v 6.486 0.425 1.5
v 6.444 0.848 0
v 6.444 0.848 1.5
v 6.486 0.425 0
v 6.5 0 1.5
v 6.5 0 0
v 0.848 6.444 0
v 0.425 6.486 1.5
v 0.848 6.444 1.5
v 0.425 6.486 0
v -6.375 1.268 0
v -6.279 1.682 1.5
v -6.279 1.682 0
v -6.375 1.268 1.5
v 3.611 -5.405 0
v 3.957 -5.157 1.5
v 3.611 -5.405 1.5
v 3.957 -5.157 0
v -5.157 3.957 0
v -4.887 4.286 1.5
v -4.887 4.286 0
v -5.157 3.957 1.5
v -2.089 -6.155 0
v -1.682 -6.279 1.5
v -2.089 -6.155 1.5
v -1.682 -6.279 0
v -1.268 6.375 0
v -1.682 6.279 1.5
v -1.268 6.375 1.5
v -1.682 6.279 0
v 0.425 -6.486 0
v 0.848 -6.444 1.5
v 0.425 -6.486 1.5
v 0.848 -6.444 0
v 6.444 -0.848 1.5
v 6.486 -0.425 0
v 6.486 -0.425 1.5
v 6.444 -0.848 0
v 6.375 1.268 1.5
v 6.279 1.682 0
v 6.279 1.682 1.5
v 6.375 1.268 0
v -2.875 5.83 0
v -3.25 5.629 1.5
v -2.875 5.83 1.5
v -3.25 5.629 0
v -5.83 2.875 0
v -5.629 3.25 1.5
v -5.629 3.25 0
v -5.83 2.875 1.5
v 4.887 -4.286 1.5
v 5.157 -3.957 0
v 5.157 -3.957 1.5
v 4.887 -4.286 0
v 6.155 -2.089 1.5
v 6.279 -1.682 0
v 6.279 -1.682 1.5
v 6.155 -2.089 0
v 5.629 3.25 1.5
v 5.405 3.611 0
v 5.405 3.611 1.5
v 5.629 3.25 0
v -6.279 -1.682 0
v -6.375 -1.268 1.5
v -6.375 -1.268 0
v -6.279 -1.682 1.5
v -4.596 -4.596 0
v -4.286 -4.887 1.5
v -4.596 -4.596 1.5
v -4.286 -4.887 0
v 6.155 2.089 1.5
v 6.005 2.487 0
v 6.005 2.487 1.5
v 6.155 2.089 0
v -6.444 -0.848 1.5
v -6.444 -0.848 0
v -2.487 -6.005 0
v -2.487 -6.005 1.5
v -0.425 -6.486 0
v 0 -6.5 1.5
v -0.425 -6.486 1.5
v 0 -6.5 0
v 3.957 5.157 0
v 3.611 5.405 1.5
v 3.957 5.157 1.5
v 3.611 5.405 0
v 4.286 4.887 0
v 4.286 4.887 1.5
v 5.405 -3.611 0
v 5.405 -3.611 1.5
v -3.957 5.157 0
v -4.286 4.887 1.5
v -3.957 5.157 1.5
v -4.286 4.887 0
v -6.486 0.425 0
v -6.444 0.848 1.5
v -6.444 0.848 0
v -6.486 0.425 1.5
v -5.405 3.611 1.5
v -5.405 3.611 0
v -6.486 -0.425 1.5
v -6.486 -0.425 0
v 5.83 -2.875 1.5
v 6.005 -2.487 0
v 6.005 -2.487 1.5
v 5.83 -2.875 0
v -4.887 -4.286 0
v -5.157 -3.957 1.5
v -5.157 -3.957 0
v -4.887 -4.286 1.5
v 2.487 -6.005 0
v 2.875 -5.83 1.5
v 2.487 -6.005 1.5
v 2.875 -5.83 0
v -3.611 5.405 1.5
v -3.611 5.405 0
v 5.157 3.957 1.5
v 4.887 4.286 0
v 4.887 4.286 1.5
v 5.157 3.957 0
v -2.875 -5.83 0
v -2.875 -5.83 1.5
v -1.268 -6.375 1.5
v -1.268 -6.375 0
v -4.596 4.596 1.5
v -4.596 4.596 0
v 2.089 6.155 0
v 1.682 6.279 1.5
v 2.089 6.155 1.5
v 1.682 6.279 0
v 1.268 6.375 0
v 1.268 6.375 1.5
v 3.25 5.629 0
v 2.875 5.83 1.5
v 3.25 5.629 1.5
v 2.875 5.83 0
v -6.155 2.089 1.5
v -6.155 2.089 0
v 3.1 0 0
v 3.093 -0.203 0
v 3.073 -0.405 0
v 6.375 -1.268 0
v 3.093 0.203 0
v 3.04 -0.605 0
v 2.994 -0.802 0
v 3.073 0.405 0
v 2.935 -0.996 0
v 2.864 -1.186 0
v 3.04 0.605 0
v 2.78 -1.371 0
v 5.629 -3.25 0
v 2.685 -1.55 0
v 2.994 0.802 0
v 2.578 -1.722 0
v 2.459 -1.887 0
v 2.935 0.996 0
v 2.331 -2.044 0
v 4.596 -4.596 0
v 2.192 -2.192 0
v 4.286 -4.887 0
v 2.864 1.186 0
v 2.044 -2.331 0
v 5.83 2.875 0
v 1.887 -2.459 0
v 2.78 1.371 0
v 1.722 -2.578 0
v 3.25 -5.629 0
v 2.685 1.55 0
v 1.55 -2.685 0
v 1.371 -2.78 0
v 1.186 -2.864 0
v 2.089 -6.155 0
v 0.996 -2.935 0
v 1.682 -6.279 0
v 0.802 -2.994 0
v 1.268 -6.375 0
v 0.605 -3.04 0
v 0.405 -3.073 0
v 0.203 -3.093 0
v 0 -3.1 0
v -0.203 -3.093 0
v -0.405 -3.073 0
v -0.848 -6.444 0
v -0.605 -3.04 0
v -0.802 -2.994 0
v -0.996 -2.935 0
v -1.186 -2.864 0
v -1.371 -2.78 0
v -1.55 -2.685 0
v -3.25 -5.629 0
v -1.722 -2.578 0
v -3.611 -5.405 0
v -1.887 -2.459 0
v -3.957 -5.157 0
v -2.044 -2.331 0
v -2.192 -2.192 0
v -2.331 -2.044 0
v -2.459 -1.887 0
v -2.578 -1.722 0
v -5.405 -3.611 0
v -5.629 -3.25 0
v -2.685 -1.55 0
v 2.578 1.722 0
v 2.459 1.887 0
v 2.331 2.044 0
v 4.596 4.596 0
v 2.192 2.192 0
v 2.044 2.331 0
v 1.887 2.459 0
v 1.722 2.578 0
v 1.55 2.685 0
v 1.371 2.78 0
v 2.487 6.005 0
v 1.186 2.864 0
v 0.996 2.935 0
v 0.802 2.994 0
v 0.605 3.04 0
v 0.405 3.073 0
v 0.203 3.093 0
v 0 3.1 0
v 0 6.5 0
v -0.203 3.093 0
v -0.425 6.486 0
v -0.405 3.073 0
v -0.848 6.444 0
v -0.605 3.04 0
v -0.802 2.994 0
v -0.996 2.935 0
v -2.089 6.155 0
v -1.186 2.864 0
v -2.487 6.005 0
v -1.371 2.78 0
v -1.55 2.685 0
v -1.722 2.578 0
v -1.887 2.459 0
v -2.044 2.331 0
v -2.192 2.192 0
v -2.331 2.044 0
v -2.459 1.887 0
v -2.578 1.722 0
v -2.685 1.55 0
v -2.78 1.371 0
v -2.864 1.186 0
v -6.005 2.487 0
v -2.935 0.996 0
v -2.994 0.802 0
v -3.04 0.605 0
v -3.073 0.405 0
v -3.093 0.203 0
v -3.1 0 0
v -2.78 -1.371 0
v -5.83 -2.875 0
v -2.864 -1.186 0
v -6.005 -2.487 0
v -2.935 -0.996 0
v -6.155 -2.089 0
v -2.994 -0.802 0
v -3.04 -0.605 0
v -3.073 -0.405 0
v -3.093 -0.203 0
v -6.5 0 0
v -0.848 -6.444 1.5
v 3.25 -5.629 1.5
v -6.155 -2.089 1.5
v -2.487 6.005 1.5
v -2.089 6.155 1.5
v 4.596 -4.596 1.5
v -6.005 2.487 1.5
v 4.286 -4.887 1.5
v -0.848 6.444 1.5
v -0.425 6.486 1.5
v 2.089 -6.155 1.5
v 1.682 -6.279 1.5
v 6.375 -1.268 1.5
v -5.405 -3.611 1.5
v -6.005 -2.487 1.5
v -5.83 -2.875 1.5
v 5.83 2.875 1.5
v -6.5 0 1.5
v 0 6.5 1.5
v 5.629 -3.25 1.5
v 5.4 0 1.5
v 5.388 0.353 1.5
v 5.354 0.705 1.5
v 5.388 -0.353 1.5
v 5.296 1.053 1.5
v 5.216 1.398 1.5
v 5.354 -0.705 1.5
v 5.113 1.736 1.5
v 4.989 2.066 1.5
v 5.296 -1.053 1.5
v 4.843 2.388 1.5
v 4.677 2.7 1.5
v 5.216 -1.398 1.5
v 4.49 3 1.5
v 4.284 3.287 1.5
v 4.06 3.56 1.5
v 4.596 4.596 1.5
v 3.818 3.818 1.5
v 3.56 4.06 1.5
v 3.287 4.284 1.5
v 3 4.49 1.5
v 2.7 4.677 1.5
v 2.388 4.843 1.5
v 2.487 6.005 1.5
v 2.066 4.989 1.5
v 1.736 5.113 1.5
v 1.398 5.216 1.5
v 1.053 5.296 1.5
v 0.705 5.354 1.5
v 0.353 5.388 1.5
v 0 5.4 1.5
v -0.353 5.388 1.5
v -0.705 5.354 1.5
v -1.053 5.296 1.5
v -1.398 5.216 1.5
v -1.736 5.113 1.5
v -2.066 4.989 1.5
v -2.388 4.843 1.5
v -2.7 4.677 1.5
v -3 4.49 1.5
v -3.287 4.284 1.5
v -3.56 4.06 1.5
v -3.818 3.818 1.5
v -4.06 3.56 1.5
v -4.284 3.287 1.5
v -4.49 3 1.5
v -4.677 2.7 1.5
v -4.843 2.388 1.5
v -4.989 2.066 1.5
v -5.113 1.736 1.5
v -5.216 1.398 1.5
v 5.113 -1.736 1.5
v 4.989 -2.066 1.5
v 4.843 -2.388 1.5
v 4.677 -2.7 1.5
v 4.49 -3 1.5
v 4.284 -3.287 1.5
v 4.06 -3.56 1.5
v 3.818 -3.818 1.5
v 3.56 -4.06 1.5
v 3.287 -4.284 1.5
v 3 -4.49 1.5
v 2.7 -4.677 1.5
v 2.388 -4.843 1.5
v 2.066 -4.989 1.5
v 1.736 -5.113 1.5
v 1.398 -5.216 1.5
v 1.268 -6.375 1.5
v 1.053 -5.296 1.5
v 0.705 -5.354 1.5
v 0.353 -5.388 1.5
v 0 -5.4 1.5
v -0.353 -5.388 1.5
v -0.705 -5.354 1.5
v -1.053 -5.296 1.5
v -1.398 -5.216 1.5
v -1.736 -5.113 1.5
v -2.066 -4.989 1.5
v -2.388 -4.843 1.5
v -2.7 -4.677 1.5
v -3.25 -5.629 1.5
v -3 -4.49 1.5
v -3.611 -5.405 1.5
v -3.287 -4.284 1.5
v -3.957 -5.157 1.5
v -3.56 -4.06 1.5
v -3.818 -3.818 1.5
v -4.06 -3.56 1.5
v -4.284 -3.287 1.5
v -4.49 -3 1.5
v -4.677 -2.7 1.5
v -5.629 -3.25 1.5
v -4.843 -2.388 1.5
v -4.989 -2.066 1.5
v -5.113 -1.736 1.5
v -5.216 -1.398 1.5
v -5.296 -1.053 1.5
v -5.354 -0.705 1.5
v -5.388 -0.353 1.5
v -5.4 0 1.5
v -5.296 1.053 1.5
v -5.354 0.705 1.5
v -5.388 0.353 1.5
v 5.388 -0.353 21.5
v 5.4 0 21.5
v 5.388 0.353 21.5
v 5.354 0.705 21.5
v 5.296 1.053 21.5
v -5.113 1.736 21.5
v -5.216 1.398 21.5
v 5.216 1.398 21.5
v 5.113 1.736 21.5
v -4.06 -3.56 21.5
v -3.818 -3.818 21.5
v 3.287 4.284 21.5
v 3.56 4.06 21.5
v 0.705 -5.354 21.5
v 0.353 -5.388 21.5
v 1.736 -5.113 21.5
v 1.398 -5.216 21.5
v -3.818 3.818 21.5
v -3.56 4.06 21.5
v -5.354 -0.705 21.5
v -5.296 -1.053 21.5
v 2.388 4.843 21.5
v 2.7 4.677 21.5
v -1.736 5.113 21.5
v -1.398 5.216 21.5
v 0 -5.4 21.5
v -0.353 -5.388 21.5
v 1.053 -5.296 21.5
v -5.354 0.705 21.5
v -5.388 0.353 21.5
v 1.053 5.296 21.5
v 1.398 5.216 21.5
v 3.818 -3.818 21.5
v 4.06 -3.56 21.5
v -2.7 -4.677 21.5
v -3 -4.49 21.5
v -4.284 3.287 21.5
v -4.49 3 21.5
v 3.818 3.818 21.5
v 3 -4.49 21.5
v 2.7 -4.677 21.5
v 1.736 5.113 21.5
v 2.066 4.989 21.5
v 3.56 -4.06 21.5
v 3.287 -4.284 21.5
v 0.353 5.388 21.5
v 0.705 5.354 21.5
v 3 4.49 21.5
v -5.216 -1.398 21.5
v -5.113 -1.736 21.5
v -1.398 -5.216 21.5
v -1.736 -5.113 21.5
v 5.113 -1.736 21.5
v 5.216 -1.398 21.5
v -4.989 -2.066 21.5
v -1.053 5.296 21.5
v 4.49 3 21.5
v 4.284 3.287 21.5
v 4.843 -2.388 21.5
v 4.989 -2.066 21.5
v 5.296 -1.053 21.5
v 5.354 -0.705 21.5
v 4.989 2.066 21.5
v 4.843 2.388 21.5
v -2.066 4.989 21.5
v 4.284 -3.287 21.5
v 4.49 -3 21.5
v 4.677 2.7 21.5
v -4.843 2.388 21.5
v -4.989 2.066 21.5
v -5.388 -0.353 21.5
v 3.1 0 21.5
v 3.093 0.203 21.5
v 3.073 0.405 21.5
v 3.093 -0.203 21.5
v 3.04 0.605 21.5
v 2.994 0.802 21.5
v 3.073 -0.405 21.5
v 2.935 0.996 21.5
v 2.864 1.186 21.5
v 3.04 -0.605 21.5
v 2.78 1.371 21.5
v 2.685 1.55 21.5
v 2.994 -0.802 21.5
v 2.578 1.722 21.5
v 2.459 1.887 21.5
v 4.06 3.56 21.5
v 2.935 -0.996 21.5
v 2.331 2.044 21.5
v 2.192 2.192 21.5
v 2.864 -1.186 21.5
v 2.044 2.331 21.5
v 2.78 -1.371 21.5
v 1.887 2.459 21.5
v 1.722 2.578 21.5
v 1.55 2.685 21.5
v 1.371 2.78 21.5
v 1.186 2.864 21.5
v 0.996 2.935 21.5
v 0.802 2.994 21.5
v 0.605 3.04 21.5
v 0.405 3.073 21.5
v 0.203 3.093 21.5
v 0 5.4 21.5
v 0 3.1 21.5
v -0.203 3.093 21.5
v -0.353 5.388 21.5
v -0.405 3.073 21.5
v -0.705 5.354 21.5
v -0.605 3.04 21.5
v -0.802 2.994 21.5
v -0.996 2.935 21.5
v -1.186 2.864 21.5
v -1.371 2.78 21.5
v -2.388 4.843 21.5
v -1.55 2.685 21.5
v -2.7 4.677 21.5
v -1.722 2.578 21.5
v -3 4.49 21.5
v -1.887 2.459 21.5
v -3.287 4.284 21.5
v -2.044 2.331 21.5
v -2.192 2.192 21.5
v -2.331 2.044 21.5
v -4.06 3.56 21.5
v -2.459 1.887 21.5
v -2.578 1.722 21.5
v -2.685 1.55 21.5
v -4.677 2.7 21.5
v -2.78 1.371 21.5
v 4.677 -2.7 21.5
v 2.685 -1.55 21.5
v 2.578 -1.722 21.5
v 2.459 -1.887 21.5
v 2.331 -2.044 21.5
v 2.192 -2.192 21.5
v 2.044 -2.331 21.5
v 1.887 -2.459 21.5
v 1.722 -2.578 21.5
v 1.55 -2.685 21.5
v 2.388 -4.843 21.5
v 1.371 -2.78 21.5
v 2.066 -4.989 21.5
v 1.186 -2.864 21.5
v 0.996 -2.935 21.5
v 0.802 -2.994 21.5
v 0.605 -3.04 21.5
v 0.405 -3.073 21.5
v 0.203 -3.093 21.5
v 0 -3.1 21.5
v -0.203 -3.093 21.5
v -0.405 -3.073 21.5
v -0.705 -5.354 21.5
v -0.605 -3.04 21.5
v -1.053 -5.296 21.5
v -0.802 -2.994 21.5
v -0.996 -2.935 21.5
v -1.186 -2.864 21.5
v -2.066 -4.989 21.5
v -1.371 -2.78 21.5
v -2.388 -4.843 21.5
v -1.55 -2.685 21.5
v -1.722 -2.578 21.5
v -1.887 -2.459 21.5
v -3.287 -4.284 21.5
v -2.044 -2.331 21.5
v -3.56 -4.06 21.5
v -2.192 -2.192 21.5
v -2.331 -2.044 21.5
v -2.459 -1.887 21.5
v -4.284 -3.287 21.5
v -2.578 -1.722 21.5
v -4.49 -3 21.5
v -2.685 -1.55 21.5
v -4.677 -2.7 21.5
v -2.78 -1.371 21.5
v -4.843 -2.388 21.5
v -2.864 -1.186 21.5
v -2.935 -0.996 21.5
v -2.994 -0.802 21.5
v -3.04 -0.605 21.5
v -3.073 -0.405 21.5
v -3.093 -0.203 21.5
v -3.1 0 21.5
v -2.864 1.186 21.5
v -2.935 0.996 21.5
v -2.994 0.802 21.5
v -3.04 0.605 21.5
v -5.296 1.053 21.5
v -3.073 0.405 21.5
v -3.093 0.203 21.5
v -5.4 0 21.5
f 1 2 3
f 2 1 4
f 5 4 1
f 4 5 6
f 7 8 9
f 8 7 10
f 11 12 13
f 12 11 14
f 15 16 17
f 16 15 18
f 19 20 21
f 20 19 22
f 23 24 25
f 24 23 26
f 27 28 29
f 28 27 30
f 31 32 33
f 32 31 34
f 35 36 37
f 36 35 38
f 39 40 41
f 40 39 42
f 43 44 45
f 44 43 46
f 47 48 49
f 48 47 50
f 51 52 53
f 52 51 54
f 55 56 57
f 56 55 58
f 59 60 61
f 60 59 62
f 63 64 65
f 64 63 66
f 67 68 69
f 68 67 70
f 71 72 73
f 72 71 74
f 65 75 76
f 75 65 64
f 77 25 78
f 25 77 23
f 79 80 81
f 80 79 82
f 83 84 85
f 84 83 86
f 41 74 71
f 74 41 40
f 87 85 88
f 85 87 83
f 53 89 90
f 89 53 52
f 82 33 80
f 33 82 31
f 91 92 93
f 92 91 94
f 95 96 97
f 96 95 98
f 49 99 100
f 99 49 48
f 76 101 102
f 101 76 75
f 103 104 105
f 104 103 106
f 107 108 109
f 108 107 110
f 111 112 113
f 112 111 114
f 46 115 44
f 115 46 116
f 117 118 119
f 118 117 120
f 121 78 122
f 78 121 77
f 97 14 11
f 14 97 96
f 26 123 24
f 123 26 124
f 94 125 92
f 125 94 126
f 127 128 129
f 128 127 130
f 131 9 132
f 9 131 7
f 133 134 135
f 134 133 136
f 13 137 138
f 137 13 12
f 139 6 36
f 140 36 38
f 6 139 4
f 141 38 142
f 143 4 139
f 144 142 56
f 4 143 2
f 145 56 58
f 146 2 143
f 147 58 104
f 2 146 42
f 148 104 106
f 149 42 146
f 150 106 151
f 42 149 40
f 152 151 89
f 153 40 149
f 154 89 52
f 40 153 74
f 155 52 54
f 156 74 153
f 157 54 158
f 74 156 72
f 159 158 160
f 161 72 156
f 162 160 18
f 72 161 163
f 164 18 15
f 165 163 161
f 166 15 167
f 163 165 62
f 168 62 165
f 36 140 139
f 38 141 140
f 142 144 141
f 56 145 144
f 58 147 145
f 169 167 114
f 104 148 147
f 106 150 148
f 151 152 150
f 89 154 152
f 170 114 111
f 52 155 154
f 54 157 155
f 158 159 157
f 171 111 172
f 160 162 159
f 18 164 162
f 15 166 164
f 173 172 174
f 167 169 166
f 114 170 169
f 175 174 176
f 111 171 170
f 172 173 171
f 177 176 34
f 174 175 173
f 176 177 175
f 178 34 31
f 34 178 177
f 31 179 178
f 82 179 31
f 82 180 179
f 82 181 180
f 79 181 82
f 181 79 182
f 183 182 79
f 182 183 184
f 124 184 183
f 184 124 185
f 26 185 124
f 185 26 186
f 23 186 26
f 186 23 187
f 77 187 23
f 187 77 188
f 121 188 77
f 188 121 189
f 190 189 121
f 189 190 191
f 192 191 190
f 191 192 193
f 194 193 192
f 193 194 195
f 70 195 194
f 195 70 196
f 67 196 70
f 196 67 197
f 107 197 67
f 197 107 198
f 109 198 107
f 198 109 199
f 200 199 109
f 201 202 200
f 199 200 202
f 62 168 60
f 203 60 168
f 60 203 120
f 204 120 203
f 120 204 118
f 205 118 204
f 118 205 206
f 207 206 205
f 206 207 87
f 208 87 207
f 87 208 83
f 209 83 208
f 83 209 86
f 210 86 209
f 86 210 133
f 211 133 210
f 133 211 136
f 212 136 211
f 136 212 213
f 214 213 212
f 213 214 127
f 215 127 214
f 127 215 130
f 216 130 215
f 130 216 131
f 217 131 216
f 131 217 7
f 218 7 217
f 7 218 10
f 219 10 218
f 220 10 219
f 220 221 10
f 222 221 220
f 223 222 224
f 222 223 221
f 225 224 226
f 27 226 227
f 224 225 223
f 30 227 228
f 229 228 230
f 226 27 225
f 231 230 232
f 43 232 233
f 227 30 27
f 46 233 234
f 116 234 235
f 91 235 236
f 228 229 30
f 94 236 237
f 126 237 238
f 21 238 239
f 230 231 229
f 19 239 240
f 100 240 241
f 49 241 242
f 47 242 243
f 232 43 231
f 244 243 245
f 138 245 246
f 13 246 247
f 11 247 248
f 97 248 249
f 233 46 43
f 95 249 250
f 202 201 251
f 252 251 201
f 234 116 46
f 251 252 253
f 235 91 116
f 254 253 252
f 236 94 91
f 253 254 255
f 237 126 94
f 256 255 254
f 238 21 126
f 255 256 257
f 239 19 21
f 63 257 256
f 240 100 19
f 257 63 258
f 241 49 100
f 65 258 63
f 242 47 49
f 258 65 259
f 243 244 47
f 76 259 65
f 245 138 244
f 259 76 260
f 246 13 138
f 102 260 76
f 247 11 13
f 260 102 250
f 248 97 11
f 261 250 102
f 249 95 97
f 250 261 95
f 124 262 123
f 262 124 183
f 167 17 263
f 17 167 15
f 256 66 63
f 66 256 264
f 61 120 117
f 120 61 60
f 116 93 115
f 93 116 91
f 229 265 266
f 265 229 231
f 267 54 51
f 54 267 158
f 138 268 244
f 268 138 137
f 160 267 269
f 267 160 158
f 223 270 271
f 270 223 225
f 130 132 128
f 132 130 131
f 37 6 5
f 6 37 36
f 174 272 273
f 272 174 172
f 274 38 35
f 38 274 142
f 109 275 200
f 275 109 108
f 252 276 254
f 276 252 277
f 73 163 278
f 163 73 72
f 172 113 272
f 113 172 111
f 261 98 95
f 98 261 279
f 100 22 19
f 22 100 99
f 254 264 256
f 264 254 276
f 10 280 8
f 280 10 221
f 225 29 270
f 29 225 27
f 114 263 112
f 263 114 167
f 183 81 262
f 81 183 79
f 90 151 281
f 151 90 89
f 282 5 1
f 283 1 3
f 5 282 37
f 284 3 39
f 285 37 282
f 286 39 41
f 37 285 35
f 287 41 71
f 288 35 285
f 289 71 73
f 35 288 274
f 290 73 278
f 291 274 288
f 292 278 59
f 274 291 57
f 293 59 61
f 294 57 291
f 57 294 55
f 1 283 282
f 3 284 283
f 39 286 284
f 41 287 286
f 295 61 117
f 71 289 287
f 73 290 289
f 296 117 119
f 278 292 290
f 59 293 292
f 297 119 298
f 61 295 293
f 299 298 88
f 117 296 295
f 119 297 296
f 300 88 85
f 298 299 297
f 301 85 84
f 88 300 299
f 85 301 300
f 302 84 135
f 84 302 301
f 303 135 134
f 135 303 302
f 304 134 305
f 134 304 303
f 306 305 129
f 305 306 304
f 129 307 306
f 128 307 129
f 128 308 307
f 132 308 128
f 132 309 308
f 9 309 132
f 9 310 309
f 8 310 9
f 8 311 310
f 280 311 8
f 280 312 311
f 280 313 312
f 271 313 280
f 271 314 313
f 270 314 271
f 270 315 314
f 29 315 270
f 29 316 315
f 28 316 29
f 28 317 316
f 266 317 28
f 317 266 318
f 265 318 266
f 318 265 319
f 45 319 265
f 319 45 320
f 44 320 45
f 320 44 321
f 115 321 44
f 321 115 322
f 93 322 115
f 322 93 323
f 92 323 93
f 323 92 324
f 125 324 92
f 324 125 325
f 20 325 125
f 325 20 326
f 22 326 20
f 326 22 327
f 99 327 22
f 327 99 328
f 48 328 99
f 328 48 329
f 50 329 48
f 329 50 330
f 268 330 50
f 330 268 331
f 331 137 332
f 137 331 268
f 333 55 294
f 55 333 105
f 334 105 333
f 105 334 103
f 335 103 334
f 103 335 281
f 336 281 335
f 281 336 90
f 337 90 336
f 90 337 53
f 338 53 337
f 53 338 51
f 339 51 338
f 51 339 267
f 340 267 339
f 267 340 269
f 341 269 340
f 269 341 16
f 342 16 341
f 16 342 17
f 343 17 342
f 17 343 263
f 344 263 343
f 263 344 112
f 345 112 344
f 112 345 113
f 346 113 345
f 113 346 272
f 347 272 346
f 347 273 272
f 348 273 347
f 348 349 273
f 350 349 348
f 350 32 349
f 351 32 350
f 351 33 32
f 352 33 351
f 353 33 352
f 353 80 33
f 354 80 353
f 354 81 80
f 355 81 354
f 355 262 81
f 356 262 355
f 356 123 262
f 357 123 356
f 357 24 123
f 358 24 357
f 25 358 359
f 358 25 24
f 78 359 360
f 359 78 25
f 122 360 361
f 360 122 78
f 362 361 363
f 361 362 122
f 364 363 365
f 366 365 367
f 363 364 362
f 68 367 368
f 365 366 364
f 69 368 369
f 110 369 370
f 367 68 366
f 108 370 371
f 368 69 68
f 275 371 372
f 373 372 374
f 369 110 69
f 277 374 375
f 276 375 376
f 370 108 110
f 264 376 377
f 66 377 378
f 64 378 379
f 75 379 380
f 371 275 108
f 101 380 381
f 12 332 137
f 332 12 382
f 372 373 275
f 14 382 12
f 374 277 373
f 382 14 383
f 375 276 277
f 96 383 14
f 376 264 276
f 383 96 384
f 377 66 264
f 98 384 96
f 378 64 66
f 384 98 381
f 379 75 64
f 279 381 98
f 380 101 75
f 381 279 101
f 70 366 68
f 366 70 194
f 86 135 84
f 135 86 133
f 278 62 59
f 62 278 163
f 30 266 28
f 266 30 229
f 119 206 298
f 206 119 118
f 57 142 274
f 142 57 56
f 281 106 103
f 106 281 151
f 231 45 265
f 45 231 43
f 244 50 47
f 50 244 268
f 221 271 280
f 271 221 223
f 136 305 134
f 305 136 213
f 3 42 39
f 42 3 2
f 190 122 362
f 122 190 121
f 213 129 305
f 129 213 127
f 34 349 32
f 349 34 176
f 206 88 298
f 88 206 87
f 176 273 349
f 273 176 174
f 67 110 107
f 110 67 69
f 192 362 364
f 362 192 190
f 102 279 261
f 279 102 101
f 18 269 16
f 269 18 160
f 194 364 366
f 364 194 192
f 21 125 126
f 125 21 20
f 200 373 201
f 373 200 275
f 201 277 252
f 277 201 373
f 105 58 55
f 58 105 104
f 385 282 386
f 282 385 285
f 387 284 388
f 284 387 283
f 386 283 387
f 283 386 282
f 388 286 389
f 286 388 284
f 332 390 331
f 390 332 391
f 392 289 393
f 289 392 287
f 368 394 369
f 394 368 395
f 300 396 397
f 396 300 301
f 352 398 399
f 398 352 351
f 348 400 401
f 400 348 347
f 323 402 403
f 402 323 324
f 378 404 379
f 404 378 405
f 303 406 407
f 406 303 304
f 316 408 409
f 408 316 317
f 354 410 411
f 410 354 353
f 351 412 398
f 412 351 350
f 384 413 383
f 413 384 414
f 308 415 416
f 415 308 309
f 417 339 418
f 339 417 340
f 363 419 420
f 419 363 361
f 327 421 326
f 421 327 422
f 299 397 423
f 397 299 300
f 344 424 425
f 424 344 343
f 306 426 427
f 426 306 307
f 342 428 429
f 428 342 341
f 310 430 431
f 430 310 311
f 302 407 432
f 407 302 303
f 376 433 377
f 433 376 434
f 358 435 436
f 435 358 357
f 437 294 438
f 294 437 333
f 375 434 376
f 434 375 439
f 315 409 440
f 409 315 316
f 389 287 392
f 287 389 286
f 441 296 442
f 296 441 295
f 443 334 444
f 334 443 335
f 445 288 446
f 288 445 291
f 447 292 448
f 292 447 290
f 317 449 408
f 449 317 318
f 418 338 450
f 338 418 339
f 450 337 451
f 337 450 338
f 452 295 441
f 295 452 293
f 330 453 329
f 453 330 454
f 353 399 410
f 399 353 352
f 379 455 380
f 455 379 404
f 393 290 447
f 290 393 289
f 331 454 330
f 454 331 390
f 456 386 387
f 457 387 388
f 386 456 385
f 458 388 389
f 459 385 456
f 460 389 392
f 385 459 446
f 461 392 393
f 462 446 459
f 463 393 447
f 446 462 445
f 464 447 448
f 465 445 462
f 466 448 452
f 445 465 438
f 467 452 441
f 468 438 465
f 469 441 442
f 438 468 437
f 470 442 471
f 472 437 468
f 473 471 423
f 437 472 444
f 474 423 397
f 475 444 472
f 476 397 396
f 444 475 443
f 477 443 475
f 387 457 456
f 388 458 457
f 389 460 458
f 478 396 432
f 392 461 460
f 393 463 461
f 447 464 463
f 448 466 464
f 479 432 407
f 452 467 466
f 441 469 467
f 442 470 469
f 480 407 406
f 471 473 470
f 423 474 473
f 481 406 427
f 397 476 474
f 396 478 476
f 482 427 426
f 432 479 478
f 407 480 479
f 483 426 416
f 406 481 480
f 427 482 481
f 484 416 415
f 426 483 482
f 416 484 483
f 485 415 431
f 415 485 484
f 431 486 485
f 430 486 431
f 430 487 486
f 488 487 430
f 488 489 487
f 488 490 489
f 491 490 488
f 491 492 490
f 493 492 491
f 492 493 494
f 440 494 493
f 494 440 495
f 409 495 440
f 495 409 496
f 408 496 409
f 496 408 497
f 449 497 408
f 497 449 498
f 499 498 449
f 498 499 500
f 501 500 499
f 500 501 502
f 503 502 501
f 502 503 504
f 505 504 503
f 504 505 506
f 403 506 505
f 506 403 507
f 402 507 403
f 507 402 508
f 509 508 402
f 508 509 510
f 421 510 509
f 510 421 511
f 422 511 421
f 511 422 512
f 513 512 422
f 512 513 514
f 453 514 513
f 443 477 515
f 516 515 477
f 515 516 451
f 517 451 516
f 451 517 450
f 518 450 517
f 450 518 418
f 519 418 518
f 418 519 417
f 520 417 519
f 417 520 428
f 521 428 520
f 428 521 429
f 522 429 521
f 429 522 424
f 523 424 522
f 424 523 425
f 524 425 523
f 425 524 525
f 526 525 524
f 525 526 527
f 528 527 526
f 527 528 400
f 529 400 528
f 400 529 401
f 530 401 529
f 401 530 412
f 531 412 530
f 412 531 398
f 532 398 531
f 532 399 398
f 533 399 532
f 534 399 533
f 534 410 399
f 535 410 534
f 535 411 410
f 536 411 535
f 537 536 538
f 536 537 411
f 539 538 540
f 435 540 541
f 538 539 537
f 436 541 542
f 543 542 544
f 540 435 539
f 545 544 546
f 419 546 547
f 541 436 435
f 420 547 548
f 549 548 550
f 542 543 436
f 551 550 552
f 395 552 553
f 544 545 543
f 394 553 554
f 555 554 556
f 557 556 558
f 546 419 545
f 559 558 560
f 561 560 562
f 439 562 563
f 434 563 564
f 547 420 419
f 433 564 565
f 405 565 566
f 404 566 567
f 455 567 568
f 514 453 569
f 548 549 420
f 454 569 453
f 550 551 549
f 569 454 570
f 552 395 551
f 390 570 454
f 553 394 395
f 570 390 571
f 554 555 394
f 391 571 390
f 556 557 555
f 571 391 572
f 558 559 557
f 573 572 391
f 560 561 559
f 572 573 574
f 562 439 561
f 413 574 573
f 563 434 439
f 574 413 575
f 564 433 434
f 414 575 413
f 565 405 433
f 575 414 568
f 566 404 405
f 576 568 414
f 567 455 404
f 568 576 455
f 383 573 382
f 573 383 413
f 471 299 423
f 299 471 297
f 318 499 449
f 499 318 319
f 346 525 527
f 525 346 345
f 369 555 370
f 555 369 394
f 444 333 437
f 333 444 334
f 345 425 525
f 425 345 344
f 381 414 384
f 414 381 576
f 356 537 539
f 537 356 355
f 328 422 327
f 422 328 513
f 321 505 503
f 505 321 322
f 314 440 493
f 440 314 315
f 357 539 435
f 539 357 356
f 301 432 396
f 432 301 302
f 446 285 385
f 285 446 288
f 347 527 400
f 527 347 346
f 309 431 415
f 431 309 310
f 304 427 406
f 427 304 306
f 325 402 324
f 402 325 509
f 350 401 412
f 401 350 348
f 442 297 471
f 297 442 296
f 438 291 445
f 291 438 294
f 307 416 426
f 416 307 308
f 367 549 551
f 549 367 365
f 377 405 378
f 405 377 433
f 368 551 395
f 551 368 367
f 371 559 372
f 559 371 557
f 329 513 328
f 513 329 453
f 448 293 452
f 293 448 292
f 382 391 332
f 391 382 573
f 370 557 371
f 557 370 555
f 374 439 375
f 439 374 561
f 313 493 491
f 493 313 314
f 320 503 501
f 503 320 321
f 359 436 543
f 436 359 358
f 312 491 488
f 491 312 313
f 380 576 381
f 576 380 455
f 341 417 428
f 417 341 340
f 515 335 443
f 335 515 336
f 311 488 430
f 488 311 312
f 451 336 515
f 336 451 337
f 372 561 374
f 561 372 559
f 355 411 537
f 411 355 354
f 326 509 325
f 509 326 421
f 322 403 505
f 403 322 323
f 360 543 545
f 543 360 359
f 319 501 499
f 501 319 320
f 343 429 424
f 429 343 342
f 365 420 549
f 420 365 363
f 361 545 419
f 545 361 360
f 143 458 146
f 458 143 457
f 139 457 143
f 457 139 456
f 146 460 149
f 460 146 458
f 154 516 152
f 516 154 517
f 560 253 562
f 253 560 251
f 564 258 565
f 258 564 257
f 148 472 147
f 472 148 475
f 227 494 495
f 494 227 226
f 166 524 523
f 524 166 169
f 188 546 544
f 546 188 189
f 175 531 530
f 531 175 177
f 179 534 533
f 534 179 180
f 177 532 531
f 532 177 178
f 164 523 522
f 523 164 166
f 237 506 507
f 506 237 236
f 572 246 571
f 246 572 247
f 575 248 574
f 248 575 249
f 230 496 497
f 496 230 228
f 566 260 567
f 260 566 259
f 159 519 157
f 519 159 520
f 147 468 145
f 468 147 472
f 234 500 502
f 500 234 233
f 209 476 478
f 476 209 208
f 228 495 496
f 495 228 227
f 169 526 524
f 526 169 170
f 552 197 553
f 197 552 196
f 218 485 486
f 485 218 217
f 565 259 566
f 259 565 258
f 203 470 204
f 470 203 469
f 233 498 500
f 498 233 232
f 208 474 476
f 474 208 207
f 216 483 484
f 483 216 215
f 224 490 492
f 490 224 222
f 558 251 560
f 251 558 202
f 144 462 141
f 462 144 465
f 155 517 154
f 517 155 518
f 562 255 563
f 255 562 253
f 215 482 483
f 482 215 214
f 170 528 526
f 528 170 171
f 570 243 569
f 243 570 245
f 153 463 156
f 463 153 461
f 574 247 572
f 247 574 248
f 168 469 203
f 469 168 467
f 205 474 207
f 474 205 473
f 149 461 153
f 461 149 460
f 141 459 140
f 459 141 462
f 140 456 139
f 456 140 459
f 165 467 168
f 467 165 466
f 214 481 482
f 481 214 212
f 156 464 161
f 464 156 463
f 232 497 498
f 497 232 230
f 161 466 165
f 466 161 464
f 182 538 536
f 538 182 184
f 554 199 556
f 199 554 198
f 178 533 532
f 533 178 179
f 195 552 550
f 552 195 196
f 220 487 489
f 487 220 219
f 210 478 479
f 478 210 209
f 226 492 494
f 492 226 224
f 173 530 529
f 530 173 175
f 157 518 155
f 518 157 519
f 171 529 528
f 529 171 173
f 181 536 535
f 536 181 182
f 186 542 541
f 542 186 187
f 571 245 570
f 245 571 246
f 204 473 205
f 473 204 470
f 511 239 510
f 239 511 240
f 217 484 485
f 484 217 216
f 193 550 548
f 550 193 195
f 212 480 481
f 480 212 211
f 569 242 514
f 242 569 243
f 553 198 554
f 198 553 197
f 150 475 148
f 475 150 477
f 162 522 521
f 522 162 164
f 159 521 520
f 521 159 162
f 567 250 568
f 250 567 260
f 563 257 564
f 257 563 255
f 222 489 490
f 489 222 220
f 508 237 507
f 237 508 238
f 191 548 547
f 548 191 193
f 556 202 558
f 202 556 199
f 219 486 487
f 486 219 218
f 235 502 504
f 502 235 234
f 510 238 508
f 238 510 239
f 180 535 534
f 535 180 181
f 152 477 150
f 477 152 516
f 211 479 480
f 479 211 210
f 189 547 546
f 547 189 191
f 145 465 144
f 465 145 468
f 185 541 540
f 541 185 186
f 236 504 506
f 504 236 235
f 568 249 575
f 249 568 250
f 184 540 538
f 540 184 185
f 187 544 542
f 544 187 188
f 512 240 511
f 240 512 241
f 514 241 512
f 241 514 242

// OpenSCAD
// PCR tube adapter sleeve - fits a 0.2 mL tube into a 1.5 mL rack hole
// Print orientation: collar on the bed (z = 0), sleeve body builds upward.

// ---------- Parameters ----------
collar_d        = 13;     // collar outer diameter (mm)
collar_t        = 1.5;    // collar thickness (mm)
sleeve_d        = 10.8;   // sleeve outer diameter (mm)
sleeve_h        = 20;     // sleeve body height above collar (mm)
bore_d          = 6.2;    // through-bore diameter (mm)
eps             = 0.5;    // cutter overshoot past faces (mm)

$fn = 96;

// ---------- Model ----------
total_h = collar_t + sleeve_h;   // 21.5 mm overall height

difference() {
    union() {
        // Collar: z = 0 to 1.5, centred on origin in XY
        cylinder(d = collar_d, h = collar_t);

        // Sleeve body: z = 1.5 to 21.5, centred on origin in XY
        translate([0, 0, collar_t])
            cylinder(d = sleeve_d, h = sleeve_h);
    }

    // Straight through-bore, open at both ends
    translate([0, 0, -eps])
        cylinder(d = bore_d, h = total_h + 2 * eps);
}
